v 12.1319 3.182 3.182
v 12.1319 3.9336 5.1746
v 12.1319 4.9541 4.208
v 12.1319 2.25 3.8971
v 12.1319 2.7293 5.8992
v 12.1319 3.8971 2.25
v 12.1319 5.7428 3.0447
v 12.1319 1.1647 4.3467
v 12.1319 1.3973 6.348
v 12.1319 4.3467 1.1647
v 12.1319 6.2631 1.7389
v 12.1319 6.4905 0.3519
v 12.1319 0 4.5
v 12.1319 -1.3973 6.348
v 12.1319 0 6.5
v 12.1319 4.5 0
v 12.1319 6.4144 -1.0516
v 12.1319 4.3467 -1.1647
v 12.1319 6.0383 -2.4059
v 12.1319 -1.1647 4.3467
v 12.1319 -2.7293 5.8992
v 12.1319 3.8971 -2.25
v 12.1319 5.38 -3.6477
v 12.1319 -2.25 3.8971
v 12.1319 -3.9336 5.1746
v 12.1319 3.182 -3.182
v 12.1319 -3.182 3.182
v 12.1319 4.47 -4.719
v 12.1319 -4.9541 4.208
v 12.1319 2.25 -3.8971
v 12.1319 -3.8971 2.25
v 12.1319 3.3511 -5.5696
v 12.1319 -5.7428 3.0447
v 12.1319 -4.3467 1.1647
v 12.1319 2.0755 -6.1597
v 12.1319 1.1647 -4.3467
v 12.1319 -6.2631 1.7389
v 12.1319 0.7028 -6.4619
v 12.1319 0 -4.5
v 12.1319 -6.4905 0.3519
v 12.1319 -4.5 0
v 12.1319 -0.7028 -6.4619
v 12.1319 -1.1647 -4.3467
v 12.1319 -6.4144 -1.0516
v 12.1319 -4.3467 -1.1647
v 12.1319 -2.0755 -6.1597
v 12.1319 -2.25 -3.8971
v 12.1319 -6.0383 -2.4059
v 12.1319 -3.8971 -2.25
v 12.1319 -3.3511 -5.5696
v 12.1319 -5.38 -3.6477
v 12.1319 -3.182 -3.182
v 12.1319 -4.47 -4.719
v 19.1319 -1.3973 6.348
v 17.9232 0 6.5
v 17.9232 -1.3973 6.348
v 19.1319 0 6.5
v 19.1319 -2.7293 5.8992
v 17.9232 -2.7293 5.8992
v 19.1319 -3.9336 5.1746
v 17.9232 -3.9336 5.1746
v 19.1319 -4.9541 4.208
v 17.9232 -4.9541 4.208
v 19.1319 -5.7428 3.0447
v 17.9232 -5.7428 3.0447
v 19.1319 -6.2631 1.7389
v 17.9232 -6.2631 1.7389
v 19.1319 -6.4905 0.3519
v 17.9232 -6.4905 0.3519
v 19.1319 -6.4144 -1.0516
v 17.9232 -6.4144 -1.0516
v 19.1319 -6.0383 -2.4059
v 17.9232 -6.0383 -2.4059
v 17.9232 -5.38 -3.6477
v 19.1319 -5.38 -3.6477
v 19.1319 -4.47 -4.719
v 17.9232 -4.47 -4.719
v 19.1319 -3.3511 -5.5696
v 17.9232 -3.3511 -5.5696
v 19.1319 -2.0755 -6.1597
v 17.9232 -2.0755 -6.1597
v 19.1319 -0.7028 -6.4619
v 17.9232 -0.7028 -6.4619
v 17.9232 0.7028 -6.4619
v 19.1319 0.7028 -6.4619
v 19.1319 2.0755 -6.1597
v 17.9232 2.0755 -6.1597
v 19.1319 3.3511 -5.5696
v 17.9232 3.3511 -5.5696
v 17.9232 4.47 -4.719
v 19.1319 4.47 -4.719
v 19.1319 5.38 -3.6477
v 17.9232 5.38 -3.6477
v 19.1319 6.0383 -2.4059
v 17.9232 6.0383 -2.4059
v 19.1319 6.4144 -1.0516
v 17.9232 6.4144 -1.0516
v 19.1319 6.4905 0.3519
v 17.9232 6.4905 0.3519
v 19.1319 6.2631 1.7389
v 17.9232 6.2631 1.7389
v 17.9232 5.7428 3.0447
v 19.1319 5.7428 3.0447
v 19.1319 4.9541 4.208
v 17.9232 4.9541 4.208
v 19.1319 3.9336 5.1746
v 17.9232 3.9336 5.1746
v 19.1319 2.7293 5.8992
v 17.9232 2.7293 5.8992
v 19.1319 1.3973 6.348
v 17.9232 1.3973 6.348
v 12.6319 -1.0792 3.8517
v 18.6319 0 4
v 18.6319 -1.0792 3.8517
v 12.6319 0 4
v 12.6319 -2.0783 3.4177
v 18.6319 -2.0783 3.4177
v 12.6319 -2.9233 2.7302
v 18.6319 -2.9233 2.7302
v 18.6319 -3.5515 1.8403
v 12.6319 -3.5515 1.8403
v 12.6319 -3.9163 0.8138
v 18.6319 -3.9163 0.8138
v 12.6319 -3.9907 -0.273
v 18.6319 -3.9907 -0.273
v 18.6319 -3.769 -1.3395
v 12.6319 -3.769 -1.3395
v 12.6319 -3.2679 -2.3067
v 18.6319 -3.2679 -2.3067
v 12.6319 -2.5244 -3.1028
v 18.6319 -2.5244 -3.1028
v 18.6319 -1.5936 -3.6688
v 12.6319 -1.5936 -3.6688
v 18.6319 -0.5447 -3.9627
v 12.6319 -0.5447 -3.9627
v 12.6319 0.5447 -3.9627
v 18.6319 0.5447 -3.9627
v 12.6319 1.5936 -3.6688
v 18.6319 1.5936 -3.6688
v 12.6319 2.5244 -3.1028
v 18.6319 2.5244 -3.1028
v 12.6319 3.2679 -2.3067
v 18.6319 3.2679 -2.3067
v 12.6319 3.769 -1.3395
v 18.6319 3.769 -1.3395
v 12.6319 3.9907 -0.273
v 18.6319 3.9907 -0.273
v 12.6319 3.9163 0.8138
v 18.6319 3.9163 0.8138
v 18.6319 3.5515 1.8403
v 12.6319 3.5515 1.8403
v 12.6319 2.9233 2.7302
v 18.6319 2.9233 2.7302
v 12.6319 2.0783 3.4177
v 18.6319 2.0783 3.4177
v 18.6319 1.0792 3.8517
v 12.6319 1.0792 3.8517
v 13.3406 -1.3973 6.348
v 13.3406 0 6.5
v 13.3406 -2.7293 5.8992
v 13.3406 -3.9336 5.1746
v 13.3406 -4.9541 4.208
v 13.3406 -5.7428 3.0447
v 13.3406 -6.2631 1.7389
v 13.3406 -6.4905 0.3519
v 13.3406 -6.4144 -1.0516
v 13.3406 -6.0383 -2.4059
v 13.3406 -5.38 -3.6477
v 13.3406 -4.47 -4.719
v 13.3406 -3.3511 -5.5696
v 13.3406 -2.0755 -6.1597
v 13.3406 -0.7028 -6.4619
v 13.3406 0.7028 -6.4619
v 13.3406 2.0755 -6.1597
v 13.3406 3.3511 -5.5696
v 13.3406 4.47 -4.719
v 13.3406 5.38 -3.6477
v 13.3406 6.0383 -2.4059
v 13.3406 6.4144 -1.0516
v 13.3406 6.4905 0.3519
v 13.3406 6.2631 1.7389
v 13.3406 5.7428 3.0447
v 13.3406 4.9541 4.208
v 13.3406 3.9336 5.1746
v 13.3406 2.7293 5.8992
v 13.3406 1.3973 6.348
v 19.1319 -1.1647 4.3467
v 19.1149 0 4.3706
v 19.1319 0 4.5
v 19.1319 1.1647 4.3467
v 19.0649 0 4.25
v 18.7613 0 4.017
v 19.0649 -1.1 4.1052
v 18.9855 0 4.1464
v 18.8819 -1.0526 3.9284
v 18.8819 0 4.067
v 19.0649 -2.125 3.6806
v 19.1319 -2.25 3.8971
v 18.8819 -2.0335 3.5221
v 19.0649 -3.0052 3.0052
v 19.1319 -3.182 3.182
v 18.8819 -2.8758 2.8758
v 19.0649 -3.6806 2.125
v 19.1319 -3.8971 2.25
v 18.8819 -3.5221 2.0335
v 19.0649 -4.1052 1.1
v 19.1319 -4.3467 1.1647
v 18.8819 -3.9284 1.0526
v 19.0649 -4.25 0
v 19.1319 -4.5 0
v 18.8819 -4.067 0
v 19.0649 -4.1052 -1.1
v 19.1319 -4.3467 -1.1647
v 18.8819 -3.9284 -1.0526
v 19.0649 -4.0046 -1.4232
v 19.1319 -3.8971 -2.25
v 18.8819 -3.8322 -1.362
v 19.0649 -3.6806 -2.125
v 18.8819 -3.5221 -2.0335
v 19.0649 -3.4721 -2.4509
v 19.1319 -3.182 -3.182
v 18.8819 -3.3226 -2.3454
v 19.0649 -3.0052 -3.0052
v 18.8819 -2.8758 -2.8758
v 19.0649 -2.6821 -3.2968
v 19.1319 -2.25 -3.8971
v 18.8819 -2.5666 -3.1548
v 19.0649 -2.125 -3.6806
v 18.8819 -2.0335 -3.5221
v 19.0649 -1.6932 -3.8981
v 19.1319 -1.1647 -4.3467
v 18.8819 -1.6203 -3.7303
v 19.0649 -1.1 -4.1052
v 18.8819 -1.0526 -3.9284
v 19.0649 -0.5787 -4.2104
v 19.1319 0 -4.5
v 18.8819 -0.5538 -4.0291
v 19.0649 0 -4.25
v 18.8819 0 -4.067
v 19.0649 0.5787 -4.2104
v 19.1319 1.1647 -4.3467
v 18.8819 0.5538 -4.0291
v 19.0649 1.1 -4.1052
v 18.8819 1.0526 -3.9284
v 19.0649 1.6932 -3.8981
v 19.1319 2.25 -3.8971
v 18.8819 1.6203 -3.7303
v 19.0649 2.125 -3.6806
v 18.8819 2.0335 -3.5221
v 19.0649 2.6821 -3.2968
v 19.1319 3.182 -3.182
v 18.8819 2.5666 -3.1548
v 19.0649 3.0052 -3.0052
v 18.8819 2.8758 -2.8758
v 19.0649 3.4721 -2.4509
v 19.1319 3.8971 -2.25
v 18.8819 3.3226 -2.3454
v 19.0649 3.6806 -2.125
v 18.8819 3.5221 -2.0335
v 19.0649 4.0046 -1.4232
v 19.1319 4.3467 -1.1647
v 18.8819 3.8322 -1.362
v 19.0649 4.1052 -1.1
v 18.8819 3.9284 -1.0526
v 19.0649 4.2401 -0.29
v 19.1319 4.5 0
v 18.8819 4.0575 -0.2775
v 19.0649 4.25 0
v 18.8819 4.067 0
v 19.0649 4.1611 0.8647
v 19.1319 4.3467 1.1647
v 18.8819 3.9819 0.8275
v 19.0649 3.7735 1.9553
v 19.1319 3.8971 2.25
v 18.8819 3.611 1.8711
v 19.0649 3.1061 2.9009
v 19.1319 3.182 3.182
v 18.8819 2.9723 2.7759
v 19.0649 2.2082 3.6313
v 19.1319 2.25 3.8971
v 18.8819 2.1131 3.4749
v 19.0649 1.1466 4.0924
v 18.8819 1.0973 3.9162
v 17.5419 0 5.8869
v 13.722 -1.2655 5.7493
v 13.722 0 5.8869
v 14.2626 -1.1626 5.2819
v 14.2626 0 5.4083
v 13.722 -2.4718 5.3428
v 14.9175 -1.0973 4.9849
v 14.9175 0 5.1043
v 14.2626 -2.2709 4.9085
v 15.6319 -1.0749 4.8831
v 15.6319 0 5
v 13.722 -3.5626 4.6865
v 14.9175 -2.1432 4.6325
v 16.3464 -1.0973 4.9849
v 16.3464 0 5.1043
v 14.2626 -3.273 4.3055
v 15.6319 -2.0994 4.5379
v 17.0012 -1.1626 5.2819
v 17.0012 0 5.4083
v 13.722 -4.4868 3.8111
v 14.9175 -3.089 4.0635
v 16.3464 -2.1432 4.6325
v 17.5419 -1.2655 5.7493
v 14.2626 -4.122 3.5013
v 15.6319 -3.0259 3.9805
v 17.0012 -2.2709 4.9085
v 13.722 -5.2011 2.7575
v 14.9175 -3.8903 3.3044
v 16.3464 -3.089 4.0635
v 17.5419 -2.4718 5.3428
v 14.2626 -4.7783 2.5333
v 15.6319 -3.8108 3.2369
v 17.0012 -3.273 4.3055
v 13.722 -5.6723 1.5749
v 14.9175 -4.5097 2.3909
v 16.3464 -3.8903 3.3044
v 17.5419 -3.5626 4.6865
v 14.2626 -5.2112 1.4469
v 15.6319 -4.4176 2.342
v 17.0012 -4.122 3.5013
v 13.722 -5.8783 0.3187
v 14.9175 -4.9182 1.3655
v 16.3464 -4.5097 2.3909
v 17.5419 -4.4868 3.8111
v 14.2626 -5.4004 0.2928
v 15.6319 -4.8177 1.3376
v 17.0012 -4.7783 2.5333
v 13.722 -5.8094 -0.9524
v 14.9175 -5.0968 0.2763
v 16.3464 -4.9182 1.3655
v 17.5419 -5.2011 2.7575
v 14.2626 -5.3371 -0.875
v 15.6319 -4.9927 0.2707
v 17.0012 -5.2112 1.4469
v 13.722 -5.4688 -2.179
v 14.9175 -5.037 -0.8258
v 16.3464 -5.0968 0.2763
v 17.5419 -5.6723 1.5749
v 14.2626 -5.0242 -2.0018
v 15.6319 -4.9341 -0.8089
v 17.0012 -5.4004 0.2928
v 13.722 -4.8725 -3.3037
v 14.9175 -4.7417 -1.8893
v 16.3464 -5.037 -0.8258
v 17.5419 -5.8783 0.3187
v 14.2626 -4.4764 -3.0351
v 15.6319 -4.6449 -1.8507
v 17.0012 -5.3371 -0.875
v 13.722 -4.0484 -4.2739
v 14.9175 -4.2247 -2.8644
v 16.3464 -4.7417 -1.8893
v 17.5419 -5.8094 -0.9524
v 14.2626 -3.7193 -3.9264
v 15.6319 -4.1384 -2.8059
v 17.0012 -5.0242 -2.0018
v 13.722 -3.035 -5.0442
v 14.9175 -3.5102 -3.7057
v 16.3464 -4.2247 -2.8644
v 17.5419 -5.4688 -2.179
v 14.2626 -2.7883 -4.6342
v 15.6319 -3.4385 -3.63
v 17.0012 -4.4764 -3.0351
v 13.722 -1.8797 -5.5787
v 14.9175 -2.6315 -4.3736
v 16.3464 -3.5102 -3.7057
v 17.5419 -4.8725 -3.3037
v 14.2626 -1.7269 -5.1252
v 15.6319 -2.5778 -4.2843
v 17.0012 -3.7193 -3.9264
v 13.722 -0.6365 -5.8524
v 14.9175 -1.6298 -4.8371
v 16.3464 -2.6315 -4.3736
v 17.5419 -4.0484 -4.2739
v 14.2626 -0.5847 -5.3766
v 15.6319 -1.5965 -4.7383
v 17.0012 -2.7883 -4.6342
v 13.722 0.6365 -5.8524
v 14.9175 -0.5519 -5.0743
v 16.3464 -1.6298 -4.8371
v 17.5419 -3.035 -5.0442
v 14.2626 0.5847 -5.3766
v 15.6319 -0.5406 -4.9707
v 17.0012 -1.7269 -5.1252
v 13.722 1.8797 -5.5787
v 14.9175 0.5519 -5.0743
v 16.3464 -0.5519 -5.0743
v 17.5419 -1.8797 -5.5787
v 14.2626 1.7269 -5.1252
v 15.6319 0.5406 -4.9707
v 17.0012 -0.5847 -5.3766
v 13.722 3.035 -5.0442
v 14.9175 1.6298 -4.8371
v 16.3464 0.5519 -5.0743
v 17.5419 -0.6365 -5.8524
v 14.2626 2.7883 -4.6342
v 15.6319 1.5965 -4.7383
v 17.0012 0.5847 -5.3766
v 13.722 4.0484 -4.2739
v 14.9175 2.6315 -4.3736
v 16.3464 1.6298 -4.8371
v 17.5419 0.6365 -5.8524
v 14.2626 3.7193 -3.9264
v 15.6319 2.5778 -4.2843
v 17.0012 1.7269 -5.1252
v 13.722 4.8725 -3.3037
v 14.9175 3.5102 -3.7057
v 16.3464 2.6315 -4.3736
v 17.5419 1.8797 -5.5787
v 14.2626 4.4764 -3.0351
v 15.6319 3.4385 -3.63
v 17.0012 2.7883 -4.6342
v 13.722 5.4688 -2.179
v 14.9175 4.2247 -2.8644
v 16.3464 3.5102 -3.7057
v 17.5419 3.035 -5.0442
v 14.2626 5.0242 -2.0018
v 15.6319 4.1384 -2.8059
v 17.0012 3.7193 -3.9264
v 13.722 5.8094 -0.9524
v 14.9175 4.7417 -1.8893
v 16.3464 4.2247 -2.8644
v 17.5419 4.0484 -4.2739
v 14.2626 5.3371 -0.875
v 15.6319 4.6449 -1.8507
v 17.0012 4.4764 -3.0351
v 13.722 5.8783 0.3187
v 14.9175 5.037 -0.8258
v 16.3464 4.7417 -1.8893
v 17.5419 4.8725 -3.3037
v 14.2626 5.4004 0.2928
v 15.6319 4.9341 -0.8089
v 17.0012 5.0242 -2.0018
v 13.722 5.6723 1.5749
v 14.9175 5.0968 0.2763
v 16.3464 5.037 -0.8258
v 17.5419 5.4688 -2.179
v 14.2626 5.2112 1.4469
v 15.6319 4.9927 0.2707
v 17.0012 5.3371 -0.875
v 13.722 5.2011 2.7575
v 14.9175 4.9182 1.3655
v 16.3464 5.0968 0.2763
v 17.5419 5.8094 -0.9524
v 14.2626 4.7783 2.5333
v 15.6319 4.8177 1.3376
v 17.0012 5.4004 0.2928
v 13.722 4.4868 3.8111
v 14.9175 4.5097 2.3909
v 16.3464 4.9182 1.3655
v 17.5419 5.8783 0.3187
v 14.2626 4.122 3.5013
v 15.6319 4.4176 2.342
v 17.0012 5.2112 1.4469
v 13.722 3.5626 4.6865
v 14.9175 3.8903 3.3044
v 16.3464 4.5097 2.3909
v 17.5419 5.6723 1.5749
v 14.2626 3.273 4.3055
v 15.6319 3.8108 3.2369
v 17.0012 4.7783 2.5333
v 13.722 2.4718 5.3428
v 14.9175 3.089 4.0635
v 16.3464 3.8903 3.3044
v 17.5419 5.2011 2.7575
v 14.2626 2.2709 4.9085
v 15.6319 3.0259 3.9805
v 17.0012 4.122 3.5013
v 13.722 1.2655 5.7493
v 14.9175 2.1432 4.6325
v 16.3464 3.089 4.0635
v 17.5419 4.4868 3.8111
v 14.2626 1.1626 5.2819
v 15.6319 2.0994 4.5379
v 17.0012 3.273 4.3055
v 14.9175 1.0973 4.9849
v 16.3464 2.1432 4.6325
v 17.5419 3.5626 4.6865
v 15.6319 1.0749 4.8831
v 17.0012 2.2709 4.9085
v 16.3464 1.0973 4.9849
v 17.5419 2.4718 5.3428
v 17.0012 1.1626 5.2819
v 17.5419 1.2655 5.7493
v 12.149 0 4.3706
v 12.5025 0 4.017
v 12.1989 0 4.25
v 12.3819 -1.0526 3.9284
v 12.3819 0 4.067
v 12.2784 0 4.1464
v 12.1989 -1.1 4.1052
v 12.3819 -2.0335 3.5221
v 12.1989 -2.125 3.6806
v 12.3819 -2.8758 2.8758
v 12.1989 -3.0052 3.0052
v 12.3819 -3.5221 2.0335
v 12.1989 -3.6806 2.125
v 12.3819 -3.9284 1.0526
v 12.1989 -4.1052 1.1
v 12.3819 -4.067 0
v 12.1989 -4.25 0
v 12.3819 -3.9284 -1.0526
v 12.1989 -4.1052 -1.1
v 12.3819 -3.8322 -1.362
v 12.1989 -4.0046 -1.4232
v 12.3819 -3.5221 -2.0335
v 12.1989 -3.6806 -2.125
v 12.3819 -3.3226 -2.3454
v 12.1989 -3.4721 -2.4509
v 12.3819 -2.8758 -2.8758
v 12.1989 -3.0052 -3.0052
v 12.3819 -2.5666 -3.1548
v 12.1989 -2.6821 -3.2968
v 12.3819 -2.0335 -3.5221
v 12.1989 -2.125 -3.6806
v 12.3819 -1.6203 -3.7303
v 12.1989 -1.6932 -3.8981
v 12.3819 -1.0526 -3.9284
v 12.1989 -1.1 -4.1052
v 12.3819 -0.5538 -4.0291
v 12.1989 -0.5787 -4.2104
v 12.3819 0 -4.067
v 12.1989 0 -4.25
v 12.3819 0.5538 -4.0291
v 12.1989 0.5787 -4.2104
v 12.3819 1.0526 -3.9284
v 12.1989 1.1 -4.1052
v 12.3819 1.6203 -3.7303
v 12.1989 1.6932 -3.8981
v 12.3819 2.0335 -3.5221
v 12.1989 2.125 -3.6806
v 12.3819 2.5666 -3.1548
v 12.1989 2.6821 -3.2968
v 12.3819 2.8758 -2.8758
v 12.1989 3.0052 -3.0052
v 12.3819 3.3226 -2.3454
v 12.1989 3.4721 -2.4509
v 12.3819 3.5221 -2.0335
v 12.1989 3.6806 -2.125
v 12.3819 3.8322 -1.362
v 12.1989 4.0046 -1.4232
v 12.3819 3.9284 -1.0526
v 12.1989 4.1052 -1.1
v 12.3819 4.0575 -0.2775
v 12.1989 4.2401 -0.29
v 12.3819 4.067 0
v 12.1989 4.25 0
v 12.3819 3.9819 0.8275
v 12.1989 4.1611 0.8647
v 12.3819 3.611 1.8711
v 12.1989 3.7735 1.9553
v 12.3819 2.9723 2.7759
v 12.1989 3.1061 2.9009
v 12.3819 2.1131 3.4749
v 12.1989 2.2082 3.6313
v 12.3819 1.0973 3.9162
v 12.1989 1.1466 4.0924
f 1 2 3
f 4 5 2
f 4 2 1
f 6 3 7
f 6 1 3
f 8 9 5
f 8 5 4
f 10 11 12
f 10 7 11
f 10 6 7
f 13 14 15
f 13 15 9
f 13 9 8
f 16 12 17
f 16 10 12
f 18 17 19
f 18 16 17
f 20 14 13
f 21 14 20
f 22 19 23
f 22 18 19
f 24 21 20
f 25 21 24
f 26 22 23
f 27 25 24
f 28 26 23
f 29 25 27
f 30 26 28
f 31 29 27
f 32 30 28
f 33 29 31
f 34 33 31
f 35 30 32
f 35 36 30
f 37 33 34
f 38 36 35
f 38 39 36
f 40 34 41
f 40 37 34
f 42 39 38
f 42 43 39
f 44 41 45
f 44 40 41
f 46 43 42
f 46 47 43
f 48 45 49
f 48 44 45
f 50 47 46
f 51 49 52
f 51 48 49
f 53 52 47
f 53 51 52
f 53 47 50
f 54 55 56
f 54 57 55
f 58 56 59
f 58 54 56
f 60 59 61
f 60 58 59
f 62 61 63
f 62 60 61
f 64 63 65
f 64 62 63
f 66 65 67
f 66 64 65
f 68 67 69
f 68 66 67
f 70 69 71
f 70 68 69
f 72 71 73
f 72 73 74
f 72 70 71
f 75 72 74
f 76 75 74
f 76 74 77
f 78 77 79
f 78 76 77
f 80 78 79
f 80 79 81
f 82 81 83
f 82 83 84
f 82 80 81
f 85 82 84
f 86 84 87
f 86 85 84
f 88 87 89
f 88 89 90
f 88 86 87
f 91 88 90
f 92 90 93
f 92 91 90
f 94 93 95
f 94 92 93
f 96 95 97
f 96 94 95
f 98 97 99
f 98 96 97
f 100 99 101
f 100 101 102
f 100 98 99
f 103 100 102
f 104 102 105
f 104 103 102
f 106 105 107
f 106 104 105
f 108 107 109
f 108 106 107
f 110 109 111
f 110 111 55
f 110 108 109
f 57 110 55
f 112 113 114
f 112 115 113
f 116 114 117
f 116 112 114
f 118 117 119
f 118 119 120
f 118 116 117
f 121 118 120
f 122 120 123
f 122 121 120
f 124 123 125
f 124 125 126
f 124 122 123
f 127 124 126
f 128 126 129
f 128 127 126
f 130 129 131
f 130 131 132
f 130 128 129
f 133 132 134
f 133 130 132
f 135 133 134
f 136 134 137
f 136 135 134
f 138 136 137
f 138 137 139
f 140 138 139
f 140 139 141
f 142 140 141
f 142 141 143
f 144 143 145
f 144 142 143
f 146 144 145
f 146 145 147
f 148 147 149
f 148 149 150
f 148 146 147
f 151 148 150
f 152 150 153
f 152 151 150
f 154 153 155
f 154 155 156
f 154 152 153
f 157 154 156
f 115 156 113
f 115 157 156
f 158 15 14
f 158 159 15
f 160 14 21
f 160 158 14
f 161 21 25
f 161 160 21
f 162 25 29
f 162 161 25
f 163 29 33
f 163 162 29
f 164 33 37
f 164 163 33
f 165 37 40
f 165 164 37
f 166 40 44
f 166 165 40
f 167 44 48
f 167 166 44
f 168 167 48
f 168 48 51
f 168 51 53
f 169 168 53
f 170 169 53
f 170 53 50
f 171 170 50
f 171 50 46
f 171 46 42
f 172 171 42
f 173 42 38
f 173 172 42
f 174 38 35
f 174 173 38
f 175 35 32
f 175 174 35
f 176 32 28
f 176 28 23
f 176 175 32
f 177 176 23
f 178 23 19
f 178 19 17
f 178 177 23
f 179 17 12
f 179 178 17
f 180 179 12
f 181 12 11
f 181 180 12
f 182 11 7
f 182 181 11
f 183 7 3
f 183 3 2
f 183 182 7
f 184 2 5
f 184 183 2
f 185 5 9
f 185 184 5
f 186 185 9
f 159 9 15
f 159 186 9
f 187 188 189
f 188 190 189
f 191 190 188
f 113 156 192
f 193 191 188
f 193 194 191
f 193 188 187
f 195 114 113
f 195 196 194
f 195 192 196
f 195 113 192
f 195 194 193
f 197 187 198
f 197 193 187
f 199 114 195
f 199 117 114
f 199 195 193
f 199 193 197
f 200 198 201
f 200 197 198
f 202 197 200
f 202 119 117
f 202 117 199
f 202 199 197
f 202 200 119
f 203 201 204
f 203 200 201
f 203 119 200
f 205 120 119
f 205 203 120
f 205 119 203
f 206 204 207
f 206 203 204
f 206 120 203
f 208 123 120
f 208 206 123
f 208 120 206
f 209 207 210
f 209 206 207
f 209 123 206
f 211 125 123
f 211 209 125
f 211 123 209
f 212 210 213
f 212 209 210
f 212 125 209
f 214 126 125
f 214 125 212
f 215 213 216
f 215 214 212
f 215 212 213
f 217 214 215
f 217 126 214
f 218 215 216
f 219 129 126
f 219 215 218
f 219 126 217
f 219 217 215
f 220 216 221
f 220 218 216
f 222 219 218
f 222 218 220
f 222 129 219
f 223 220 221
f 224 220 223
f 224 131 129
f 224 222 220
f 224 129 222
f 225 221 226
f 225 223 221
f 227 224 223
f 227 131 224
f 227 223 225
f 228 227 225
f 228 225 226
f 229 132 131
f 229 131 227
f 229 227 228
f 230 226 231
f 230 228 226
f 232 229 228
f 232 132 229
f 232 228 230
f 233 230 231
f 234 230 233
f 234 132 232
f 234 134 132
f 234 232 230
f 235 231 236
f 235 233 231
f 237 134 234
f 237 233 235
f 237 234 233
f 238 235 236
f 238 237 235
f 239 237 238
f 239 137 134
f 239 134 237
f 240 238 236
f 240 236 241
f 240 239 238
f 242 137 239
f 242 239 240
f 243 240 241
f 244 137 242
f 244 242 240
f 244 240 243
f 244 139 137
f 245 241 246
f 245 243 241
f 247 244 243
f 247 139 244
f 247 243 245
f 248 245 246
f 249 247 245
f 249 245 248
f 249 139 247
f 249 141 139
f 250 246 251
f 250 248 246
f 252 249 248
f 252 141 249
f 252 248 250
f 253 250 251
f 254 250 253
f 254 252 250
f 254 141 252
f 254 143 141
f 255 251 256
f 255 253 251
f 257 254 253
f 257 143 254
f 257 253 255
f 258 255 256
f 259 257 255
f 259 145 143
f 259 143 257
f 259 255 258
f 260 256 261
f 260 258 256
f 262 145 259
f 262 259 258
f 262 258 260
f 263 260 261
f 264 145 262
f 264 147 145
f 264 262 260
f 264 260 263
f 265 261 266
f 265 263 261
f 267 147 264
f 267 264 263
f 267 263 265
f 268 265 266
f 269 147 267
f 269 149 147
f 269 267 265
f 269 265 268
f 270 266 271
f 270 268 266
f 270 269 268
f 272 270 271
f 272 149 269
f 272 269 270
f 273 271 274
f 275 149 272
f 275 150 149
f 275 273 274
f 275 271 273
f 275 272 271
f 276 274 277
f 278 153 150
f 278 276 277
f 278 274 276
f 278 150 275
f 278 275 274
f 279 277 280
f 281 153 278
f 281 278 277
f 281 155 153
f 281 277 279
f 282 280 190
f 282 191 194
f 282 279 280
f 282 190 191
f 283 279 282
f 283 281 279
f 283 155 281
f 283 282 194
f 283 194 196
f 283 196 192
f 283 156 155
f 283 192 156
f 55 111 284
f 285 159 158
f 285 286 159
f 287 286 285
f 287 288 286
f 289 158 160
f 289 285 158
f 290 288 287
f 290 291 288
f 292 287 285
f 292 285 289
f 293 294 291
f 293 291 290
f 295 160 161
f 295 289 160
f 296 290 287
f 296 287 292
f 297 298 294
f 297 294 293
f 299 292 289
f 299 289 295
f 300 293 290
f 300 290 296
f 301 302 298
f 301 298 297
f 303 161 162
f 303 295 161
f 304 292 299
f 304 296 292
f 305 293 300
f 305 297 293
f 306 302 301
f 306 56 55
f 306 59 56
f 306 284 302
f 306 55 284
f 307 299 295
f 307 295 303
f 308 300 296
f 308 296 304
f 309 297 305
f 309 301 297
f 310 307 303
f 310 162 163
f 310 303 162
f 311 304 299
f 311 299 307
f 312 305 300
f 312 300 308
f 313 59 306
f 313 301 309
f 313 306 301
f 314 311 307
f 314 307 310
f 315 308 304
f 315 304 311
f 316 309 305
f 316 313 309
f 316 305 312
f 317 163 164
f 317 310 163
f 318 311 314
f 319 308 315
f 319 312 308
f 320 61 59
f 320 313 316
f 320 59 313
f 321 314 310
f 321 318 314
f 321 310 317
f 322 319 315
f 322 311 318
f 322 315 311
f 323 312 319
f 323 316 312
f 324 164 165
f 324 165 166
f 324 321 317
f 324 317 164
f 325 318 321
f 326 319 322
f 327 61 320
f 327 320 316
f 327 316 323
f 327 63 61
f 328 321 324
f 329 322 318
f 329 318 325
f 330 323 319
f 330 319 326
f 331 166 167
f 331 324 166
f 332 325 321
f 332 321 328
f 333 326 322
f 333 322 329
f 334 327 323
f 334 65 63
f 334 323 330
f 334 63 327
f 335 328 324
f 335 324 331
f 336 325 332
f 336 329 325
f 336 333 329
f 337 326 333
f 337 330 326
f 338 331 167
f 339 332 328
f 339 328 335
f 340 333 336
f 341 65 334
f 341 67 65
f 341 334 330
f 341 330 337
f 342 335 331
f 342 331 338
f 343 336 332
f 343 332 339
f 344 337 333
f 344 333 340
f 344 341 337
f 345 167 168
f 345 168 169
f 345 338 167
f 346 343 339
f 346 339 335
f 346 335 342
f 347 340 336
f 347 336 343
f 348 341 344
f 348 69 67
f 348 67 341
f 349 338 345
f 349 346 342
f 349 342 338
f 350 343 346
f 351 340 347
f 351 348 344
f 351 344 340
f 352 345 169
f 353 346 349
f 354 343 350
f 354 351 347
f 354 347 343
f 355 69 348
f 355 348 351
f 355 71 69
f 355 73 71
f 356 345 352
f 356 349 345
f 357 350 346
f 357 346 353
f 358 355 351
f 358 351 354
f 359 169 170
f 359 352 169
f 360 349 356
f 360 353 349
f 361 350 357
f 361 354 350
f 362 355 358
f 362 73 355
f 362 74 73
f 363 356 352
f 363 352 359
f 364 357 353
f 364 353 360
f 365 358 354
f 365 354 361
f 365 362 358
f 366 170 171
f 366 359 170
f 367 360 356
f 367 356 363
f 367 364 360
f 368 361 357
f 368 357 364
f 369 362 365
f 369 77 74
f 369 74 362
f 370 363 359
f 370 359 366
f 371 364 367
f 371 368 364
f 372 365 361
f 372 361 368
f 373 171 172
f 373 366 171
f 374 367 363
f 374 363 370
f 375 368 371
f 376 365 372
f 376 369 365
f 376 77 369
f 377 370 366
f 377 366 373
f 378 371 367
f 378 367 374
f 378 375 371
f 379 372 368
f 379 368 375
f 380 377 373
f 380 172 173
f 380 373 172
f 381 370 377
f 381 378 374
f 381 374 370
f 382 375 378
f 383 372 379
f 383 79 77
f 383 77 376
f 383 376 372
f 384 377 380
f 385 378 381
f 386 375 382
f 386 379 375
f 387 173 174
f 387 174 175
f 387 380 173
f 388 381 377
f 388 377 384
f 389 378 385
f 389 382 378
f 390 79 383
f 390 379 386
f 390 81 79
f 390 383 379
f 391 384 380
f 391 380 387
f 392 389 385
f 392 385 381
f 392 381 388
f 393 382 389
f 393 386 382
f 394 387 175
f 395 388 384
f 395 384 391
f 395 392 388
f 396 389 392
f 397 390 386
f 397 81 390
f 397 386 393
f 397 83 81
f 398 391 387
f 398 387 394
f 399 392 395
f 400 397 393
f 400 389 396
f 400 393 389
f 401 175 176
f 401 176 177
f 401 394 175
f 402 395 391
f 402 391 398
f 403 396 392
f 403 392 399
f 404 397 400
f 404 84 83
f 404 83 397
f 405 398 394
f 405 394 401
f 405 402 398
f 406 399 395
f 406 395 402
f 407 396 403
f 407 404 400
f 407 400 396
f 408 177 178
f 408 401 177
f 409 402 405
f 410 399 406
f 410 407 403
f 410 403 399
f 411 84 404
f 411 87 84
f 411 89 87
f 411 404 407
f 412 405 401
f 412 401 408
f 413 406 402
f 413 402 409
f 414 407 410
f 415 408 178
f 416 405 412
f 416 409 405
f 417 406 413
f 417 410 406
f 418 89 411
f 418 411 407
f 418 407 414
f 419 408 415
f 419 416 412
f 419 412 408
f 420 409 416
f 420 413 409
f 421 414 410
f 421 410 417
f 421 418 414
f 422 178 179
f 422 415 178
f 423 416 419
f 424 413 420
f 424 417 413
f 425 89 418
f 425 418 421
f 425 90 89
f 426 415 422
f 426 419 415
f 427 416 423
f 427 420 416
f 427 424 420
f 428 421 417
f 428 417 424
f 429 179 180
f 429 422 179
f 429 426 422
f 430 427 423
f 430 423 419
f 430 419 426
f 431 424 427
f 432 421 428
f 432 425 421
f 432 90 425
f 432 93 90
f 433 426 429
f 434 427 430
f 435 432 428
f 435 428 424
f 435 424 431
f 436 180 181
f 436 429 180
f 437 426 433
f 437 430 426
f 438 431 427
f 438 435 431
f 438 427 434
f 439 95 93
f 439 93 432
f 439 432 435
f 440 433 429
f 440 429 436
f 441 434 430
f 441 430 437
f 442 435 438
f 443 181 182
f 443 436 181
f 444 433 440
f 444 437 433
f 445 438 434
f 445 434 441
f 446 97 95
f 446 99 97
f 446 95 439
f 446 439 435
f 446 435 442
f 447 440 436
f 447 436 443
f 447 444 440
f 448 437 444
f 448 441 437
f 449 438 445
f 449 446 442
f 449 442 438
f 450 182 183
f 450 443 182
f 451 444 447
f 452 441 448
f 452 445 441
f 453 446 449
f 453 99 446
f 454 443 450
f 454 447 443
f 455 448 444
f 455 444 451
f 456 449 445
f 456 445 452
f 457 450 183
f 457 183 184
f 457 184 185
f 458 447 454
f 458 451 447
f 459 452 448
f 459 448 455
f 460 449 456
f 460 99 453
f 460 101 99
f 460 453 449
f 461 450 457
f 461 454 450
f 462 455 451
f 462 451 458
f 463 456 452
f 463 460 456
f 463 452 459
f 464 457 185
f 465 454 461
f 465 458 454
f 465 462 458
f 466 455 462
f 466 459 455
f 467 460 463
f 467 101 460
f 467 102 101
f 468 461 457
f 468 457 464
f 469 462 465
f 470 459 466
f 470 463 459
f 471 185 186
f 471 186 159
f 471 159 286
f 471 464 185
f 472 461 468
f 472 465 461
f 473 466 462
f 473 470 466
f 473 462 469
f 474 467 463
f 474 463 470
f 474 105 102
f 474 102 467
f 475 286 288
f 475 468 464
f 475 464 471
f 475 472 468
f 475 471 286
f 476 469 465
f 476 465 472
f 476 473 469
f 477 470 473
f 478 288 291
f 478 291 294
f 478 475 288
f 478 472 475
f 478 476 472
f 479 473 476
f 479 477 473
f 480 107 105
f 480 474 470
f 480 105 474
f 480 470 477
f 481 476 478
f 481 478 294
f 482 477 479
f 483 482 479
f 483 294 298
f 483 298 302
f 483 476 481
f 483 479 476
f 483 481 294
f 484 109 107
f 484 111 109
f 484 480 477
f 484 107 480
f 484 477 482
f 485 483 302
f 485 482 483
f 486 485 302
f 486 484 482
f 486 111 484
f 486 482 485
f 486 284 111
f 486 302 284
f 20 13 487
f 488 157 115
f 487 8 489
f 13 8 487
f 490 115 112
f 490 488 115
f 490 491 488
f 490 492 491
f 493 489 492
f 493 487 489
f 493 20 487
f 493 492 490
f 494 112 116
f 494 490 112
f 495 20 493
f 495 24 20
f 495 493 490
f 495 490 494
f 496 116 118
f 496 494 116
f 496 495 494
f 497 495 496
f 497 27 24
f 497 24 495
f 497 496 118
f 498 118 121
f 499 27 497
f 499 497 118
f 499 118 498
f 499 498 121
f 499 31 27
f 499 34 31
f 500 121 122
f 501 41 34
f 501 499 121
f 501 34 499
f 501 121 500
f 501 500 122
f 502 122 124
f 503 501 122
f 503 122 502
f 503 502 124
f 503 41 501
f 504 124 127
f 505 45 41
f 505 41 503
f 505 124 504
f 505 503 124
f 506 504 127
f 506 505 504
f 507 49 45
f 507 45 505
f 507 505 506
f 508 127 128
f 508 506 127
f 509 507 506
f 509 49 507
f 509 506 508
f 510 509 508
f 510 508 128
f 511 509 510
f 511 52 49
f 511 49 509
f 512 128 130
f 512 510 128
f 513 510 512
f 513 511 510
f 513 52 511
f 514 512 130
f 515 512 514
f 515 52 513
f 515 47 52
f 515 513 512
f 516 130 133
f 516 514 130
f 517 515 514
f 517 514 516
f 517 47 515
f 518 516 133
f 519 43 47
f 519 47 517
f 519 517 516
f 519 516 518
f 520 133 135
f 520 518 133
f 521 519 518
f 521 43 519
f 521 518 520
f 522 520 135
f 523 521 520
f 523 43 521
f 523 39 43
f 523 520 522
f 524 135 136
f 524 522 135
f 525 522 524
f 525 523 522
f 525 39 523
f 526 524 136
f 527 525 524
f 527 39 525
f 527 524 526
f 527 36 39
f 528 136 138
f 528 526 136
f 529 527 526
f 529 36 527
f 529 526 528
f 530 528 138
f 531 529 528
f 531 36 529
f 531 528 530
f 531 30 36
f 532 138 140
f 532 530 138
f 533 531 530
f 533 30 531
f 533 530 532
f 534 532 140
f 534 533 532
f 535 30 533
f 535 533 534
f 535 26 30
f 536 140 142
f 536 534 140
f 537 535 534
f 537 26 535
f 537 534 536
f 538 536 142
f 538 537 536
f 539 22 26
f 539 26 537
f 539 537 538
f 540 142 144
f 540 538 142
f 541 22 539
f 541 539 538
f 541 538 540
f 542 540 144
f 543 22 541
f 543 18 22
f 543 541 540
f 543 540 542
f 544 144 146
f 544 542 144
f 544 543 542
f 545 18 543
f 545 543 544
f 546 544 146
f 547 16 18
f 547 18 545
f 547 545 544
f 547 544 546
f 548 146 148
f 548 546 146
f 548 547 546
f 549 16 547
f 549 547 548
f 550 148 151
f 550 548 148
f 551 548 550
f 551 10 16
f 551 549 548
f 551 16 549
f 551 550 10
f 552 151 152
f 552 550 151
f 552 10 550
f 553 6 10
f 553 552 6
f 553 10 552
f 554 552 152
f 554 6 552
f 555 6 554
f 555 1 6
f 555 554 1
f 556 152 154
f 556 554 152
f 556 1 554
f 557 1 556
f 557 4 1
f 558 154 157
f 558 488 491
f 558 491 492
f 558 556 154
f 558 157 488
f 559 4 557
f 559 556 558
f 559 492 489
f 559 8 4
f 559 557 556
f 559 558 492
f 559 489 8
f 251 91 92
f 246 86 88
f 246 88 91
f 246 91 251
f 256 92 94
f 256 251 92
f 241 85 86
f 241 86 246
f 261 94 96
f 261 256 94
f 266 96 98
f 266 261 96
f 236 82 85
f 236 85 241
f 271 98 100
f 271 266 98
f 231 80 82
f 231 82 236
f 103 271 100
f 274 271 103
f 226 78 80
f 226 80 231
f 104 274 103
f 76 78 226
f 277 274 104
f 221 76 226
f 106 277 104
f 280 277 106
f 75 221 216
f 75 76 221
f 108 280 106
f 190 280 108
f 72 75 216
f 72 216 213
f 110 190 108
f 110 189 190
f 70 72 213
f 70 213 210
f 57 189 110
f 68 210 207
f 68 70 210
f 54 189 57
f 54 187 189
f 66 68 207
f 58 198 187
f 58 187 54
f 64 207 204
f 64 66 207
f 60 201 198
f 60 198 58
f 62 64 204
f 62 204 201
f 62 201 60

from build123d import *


with BuildPart() as part:
    # Esquisse1 → Révolution1 (revolve)
    with BuildSketch(Plane.XY, mode=Mode.PRIVATE) as r_volution1_sk:
        with BuildLine():
            Line((17.923212734, 6.5), (19.131924887, 6.5))
            Line((19.131924887, 6.5), (19.131924887, 4.5))
            ThreePointArc((19.131924887, 4.5), (18.985478277, 4.146446609), (18.631924887, 4))
            Line((18.631924887, 4), (12.631924887, 4))
            ThreePointArc((12.631924887, 4), (12.278371496, 4.146446609), (12.131924887, 4.5))
            Line((12.131924887, 4.5), (12.131924887, 6.5))
            Line((12.131924887, 6.5), (13.340637039, 6.5))
            ThreePointArc((13.340637039, 6.5), (15.631924887, 5), (17.923212734, 6.5))
        make_face()
    revolve(r_volution1_sk.sketch.rotate(Axis((0, 0, 0), (1, 0, 0)), 90), axis=Axis((0, 0, 0), (1, 0, 0)))


solid = part.part
